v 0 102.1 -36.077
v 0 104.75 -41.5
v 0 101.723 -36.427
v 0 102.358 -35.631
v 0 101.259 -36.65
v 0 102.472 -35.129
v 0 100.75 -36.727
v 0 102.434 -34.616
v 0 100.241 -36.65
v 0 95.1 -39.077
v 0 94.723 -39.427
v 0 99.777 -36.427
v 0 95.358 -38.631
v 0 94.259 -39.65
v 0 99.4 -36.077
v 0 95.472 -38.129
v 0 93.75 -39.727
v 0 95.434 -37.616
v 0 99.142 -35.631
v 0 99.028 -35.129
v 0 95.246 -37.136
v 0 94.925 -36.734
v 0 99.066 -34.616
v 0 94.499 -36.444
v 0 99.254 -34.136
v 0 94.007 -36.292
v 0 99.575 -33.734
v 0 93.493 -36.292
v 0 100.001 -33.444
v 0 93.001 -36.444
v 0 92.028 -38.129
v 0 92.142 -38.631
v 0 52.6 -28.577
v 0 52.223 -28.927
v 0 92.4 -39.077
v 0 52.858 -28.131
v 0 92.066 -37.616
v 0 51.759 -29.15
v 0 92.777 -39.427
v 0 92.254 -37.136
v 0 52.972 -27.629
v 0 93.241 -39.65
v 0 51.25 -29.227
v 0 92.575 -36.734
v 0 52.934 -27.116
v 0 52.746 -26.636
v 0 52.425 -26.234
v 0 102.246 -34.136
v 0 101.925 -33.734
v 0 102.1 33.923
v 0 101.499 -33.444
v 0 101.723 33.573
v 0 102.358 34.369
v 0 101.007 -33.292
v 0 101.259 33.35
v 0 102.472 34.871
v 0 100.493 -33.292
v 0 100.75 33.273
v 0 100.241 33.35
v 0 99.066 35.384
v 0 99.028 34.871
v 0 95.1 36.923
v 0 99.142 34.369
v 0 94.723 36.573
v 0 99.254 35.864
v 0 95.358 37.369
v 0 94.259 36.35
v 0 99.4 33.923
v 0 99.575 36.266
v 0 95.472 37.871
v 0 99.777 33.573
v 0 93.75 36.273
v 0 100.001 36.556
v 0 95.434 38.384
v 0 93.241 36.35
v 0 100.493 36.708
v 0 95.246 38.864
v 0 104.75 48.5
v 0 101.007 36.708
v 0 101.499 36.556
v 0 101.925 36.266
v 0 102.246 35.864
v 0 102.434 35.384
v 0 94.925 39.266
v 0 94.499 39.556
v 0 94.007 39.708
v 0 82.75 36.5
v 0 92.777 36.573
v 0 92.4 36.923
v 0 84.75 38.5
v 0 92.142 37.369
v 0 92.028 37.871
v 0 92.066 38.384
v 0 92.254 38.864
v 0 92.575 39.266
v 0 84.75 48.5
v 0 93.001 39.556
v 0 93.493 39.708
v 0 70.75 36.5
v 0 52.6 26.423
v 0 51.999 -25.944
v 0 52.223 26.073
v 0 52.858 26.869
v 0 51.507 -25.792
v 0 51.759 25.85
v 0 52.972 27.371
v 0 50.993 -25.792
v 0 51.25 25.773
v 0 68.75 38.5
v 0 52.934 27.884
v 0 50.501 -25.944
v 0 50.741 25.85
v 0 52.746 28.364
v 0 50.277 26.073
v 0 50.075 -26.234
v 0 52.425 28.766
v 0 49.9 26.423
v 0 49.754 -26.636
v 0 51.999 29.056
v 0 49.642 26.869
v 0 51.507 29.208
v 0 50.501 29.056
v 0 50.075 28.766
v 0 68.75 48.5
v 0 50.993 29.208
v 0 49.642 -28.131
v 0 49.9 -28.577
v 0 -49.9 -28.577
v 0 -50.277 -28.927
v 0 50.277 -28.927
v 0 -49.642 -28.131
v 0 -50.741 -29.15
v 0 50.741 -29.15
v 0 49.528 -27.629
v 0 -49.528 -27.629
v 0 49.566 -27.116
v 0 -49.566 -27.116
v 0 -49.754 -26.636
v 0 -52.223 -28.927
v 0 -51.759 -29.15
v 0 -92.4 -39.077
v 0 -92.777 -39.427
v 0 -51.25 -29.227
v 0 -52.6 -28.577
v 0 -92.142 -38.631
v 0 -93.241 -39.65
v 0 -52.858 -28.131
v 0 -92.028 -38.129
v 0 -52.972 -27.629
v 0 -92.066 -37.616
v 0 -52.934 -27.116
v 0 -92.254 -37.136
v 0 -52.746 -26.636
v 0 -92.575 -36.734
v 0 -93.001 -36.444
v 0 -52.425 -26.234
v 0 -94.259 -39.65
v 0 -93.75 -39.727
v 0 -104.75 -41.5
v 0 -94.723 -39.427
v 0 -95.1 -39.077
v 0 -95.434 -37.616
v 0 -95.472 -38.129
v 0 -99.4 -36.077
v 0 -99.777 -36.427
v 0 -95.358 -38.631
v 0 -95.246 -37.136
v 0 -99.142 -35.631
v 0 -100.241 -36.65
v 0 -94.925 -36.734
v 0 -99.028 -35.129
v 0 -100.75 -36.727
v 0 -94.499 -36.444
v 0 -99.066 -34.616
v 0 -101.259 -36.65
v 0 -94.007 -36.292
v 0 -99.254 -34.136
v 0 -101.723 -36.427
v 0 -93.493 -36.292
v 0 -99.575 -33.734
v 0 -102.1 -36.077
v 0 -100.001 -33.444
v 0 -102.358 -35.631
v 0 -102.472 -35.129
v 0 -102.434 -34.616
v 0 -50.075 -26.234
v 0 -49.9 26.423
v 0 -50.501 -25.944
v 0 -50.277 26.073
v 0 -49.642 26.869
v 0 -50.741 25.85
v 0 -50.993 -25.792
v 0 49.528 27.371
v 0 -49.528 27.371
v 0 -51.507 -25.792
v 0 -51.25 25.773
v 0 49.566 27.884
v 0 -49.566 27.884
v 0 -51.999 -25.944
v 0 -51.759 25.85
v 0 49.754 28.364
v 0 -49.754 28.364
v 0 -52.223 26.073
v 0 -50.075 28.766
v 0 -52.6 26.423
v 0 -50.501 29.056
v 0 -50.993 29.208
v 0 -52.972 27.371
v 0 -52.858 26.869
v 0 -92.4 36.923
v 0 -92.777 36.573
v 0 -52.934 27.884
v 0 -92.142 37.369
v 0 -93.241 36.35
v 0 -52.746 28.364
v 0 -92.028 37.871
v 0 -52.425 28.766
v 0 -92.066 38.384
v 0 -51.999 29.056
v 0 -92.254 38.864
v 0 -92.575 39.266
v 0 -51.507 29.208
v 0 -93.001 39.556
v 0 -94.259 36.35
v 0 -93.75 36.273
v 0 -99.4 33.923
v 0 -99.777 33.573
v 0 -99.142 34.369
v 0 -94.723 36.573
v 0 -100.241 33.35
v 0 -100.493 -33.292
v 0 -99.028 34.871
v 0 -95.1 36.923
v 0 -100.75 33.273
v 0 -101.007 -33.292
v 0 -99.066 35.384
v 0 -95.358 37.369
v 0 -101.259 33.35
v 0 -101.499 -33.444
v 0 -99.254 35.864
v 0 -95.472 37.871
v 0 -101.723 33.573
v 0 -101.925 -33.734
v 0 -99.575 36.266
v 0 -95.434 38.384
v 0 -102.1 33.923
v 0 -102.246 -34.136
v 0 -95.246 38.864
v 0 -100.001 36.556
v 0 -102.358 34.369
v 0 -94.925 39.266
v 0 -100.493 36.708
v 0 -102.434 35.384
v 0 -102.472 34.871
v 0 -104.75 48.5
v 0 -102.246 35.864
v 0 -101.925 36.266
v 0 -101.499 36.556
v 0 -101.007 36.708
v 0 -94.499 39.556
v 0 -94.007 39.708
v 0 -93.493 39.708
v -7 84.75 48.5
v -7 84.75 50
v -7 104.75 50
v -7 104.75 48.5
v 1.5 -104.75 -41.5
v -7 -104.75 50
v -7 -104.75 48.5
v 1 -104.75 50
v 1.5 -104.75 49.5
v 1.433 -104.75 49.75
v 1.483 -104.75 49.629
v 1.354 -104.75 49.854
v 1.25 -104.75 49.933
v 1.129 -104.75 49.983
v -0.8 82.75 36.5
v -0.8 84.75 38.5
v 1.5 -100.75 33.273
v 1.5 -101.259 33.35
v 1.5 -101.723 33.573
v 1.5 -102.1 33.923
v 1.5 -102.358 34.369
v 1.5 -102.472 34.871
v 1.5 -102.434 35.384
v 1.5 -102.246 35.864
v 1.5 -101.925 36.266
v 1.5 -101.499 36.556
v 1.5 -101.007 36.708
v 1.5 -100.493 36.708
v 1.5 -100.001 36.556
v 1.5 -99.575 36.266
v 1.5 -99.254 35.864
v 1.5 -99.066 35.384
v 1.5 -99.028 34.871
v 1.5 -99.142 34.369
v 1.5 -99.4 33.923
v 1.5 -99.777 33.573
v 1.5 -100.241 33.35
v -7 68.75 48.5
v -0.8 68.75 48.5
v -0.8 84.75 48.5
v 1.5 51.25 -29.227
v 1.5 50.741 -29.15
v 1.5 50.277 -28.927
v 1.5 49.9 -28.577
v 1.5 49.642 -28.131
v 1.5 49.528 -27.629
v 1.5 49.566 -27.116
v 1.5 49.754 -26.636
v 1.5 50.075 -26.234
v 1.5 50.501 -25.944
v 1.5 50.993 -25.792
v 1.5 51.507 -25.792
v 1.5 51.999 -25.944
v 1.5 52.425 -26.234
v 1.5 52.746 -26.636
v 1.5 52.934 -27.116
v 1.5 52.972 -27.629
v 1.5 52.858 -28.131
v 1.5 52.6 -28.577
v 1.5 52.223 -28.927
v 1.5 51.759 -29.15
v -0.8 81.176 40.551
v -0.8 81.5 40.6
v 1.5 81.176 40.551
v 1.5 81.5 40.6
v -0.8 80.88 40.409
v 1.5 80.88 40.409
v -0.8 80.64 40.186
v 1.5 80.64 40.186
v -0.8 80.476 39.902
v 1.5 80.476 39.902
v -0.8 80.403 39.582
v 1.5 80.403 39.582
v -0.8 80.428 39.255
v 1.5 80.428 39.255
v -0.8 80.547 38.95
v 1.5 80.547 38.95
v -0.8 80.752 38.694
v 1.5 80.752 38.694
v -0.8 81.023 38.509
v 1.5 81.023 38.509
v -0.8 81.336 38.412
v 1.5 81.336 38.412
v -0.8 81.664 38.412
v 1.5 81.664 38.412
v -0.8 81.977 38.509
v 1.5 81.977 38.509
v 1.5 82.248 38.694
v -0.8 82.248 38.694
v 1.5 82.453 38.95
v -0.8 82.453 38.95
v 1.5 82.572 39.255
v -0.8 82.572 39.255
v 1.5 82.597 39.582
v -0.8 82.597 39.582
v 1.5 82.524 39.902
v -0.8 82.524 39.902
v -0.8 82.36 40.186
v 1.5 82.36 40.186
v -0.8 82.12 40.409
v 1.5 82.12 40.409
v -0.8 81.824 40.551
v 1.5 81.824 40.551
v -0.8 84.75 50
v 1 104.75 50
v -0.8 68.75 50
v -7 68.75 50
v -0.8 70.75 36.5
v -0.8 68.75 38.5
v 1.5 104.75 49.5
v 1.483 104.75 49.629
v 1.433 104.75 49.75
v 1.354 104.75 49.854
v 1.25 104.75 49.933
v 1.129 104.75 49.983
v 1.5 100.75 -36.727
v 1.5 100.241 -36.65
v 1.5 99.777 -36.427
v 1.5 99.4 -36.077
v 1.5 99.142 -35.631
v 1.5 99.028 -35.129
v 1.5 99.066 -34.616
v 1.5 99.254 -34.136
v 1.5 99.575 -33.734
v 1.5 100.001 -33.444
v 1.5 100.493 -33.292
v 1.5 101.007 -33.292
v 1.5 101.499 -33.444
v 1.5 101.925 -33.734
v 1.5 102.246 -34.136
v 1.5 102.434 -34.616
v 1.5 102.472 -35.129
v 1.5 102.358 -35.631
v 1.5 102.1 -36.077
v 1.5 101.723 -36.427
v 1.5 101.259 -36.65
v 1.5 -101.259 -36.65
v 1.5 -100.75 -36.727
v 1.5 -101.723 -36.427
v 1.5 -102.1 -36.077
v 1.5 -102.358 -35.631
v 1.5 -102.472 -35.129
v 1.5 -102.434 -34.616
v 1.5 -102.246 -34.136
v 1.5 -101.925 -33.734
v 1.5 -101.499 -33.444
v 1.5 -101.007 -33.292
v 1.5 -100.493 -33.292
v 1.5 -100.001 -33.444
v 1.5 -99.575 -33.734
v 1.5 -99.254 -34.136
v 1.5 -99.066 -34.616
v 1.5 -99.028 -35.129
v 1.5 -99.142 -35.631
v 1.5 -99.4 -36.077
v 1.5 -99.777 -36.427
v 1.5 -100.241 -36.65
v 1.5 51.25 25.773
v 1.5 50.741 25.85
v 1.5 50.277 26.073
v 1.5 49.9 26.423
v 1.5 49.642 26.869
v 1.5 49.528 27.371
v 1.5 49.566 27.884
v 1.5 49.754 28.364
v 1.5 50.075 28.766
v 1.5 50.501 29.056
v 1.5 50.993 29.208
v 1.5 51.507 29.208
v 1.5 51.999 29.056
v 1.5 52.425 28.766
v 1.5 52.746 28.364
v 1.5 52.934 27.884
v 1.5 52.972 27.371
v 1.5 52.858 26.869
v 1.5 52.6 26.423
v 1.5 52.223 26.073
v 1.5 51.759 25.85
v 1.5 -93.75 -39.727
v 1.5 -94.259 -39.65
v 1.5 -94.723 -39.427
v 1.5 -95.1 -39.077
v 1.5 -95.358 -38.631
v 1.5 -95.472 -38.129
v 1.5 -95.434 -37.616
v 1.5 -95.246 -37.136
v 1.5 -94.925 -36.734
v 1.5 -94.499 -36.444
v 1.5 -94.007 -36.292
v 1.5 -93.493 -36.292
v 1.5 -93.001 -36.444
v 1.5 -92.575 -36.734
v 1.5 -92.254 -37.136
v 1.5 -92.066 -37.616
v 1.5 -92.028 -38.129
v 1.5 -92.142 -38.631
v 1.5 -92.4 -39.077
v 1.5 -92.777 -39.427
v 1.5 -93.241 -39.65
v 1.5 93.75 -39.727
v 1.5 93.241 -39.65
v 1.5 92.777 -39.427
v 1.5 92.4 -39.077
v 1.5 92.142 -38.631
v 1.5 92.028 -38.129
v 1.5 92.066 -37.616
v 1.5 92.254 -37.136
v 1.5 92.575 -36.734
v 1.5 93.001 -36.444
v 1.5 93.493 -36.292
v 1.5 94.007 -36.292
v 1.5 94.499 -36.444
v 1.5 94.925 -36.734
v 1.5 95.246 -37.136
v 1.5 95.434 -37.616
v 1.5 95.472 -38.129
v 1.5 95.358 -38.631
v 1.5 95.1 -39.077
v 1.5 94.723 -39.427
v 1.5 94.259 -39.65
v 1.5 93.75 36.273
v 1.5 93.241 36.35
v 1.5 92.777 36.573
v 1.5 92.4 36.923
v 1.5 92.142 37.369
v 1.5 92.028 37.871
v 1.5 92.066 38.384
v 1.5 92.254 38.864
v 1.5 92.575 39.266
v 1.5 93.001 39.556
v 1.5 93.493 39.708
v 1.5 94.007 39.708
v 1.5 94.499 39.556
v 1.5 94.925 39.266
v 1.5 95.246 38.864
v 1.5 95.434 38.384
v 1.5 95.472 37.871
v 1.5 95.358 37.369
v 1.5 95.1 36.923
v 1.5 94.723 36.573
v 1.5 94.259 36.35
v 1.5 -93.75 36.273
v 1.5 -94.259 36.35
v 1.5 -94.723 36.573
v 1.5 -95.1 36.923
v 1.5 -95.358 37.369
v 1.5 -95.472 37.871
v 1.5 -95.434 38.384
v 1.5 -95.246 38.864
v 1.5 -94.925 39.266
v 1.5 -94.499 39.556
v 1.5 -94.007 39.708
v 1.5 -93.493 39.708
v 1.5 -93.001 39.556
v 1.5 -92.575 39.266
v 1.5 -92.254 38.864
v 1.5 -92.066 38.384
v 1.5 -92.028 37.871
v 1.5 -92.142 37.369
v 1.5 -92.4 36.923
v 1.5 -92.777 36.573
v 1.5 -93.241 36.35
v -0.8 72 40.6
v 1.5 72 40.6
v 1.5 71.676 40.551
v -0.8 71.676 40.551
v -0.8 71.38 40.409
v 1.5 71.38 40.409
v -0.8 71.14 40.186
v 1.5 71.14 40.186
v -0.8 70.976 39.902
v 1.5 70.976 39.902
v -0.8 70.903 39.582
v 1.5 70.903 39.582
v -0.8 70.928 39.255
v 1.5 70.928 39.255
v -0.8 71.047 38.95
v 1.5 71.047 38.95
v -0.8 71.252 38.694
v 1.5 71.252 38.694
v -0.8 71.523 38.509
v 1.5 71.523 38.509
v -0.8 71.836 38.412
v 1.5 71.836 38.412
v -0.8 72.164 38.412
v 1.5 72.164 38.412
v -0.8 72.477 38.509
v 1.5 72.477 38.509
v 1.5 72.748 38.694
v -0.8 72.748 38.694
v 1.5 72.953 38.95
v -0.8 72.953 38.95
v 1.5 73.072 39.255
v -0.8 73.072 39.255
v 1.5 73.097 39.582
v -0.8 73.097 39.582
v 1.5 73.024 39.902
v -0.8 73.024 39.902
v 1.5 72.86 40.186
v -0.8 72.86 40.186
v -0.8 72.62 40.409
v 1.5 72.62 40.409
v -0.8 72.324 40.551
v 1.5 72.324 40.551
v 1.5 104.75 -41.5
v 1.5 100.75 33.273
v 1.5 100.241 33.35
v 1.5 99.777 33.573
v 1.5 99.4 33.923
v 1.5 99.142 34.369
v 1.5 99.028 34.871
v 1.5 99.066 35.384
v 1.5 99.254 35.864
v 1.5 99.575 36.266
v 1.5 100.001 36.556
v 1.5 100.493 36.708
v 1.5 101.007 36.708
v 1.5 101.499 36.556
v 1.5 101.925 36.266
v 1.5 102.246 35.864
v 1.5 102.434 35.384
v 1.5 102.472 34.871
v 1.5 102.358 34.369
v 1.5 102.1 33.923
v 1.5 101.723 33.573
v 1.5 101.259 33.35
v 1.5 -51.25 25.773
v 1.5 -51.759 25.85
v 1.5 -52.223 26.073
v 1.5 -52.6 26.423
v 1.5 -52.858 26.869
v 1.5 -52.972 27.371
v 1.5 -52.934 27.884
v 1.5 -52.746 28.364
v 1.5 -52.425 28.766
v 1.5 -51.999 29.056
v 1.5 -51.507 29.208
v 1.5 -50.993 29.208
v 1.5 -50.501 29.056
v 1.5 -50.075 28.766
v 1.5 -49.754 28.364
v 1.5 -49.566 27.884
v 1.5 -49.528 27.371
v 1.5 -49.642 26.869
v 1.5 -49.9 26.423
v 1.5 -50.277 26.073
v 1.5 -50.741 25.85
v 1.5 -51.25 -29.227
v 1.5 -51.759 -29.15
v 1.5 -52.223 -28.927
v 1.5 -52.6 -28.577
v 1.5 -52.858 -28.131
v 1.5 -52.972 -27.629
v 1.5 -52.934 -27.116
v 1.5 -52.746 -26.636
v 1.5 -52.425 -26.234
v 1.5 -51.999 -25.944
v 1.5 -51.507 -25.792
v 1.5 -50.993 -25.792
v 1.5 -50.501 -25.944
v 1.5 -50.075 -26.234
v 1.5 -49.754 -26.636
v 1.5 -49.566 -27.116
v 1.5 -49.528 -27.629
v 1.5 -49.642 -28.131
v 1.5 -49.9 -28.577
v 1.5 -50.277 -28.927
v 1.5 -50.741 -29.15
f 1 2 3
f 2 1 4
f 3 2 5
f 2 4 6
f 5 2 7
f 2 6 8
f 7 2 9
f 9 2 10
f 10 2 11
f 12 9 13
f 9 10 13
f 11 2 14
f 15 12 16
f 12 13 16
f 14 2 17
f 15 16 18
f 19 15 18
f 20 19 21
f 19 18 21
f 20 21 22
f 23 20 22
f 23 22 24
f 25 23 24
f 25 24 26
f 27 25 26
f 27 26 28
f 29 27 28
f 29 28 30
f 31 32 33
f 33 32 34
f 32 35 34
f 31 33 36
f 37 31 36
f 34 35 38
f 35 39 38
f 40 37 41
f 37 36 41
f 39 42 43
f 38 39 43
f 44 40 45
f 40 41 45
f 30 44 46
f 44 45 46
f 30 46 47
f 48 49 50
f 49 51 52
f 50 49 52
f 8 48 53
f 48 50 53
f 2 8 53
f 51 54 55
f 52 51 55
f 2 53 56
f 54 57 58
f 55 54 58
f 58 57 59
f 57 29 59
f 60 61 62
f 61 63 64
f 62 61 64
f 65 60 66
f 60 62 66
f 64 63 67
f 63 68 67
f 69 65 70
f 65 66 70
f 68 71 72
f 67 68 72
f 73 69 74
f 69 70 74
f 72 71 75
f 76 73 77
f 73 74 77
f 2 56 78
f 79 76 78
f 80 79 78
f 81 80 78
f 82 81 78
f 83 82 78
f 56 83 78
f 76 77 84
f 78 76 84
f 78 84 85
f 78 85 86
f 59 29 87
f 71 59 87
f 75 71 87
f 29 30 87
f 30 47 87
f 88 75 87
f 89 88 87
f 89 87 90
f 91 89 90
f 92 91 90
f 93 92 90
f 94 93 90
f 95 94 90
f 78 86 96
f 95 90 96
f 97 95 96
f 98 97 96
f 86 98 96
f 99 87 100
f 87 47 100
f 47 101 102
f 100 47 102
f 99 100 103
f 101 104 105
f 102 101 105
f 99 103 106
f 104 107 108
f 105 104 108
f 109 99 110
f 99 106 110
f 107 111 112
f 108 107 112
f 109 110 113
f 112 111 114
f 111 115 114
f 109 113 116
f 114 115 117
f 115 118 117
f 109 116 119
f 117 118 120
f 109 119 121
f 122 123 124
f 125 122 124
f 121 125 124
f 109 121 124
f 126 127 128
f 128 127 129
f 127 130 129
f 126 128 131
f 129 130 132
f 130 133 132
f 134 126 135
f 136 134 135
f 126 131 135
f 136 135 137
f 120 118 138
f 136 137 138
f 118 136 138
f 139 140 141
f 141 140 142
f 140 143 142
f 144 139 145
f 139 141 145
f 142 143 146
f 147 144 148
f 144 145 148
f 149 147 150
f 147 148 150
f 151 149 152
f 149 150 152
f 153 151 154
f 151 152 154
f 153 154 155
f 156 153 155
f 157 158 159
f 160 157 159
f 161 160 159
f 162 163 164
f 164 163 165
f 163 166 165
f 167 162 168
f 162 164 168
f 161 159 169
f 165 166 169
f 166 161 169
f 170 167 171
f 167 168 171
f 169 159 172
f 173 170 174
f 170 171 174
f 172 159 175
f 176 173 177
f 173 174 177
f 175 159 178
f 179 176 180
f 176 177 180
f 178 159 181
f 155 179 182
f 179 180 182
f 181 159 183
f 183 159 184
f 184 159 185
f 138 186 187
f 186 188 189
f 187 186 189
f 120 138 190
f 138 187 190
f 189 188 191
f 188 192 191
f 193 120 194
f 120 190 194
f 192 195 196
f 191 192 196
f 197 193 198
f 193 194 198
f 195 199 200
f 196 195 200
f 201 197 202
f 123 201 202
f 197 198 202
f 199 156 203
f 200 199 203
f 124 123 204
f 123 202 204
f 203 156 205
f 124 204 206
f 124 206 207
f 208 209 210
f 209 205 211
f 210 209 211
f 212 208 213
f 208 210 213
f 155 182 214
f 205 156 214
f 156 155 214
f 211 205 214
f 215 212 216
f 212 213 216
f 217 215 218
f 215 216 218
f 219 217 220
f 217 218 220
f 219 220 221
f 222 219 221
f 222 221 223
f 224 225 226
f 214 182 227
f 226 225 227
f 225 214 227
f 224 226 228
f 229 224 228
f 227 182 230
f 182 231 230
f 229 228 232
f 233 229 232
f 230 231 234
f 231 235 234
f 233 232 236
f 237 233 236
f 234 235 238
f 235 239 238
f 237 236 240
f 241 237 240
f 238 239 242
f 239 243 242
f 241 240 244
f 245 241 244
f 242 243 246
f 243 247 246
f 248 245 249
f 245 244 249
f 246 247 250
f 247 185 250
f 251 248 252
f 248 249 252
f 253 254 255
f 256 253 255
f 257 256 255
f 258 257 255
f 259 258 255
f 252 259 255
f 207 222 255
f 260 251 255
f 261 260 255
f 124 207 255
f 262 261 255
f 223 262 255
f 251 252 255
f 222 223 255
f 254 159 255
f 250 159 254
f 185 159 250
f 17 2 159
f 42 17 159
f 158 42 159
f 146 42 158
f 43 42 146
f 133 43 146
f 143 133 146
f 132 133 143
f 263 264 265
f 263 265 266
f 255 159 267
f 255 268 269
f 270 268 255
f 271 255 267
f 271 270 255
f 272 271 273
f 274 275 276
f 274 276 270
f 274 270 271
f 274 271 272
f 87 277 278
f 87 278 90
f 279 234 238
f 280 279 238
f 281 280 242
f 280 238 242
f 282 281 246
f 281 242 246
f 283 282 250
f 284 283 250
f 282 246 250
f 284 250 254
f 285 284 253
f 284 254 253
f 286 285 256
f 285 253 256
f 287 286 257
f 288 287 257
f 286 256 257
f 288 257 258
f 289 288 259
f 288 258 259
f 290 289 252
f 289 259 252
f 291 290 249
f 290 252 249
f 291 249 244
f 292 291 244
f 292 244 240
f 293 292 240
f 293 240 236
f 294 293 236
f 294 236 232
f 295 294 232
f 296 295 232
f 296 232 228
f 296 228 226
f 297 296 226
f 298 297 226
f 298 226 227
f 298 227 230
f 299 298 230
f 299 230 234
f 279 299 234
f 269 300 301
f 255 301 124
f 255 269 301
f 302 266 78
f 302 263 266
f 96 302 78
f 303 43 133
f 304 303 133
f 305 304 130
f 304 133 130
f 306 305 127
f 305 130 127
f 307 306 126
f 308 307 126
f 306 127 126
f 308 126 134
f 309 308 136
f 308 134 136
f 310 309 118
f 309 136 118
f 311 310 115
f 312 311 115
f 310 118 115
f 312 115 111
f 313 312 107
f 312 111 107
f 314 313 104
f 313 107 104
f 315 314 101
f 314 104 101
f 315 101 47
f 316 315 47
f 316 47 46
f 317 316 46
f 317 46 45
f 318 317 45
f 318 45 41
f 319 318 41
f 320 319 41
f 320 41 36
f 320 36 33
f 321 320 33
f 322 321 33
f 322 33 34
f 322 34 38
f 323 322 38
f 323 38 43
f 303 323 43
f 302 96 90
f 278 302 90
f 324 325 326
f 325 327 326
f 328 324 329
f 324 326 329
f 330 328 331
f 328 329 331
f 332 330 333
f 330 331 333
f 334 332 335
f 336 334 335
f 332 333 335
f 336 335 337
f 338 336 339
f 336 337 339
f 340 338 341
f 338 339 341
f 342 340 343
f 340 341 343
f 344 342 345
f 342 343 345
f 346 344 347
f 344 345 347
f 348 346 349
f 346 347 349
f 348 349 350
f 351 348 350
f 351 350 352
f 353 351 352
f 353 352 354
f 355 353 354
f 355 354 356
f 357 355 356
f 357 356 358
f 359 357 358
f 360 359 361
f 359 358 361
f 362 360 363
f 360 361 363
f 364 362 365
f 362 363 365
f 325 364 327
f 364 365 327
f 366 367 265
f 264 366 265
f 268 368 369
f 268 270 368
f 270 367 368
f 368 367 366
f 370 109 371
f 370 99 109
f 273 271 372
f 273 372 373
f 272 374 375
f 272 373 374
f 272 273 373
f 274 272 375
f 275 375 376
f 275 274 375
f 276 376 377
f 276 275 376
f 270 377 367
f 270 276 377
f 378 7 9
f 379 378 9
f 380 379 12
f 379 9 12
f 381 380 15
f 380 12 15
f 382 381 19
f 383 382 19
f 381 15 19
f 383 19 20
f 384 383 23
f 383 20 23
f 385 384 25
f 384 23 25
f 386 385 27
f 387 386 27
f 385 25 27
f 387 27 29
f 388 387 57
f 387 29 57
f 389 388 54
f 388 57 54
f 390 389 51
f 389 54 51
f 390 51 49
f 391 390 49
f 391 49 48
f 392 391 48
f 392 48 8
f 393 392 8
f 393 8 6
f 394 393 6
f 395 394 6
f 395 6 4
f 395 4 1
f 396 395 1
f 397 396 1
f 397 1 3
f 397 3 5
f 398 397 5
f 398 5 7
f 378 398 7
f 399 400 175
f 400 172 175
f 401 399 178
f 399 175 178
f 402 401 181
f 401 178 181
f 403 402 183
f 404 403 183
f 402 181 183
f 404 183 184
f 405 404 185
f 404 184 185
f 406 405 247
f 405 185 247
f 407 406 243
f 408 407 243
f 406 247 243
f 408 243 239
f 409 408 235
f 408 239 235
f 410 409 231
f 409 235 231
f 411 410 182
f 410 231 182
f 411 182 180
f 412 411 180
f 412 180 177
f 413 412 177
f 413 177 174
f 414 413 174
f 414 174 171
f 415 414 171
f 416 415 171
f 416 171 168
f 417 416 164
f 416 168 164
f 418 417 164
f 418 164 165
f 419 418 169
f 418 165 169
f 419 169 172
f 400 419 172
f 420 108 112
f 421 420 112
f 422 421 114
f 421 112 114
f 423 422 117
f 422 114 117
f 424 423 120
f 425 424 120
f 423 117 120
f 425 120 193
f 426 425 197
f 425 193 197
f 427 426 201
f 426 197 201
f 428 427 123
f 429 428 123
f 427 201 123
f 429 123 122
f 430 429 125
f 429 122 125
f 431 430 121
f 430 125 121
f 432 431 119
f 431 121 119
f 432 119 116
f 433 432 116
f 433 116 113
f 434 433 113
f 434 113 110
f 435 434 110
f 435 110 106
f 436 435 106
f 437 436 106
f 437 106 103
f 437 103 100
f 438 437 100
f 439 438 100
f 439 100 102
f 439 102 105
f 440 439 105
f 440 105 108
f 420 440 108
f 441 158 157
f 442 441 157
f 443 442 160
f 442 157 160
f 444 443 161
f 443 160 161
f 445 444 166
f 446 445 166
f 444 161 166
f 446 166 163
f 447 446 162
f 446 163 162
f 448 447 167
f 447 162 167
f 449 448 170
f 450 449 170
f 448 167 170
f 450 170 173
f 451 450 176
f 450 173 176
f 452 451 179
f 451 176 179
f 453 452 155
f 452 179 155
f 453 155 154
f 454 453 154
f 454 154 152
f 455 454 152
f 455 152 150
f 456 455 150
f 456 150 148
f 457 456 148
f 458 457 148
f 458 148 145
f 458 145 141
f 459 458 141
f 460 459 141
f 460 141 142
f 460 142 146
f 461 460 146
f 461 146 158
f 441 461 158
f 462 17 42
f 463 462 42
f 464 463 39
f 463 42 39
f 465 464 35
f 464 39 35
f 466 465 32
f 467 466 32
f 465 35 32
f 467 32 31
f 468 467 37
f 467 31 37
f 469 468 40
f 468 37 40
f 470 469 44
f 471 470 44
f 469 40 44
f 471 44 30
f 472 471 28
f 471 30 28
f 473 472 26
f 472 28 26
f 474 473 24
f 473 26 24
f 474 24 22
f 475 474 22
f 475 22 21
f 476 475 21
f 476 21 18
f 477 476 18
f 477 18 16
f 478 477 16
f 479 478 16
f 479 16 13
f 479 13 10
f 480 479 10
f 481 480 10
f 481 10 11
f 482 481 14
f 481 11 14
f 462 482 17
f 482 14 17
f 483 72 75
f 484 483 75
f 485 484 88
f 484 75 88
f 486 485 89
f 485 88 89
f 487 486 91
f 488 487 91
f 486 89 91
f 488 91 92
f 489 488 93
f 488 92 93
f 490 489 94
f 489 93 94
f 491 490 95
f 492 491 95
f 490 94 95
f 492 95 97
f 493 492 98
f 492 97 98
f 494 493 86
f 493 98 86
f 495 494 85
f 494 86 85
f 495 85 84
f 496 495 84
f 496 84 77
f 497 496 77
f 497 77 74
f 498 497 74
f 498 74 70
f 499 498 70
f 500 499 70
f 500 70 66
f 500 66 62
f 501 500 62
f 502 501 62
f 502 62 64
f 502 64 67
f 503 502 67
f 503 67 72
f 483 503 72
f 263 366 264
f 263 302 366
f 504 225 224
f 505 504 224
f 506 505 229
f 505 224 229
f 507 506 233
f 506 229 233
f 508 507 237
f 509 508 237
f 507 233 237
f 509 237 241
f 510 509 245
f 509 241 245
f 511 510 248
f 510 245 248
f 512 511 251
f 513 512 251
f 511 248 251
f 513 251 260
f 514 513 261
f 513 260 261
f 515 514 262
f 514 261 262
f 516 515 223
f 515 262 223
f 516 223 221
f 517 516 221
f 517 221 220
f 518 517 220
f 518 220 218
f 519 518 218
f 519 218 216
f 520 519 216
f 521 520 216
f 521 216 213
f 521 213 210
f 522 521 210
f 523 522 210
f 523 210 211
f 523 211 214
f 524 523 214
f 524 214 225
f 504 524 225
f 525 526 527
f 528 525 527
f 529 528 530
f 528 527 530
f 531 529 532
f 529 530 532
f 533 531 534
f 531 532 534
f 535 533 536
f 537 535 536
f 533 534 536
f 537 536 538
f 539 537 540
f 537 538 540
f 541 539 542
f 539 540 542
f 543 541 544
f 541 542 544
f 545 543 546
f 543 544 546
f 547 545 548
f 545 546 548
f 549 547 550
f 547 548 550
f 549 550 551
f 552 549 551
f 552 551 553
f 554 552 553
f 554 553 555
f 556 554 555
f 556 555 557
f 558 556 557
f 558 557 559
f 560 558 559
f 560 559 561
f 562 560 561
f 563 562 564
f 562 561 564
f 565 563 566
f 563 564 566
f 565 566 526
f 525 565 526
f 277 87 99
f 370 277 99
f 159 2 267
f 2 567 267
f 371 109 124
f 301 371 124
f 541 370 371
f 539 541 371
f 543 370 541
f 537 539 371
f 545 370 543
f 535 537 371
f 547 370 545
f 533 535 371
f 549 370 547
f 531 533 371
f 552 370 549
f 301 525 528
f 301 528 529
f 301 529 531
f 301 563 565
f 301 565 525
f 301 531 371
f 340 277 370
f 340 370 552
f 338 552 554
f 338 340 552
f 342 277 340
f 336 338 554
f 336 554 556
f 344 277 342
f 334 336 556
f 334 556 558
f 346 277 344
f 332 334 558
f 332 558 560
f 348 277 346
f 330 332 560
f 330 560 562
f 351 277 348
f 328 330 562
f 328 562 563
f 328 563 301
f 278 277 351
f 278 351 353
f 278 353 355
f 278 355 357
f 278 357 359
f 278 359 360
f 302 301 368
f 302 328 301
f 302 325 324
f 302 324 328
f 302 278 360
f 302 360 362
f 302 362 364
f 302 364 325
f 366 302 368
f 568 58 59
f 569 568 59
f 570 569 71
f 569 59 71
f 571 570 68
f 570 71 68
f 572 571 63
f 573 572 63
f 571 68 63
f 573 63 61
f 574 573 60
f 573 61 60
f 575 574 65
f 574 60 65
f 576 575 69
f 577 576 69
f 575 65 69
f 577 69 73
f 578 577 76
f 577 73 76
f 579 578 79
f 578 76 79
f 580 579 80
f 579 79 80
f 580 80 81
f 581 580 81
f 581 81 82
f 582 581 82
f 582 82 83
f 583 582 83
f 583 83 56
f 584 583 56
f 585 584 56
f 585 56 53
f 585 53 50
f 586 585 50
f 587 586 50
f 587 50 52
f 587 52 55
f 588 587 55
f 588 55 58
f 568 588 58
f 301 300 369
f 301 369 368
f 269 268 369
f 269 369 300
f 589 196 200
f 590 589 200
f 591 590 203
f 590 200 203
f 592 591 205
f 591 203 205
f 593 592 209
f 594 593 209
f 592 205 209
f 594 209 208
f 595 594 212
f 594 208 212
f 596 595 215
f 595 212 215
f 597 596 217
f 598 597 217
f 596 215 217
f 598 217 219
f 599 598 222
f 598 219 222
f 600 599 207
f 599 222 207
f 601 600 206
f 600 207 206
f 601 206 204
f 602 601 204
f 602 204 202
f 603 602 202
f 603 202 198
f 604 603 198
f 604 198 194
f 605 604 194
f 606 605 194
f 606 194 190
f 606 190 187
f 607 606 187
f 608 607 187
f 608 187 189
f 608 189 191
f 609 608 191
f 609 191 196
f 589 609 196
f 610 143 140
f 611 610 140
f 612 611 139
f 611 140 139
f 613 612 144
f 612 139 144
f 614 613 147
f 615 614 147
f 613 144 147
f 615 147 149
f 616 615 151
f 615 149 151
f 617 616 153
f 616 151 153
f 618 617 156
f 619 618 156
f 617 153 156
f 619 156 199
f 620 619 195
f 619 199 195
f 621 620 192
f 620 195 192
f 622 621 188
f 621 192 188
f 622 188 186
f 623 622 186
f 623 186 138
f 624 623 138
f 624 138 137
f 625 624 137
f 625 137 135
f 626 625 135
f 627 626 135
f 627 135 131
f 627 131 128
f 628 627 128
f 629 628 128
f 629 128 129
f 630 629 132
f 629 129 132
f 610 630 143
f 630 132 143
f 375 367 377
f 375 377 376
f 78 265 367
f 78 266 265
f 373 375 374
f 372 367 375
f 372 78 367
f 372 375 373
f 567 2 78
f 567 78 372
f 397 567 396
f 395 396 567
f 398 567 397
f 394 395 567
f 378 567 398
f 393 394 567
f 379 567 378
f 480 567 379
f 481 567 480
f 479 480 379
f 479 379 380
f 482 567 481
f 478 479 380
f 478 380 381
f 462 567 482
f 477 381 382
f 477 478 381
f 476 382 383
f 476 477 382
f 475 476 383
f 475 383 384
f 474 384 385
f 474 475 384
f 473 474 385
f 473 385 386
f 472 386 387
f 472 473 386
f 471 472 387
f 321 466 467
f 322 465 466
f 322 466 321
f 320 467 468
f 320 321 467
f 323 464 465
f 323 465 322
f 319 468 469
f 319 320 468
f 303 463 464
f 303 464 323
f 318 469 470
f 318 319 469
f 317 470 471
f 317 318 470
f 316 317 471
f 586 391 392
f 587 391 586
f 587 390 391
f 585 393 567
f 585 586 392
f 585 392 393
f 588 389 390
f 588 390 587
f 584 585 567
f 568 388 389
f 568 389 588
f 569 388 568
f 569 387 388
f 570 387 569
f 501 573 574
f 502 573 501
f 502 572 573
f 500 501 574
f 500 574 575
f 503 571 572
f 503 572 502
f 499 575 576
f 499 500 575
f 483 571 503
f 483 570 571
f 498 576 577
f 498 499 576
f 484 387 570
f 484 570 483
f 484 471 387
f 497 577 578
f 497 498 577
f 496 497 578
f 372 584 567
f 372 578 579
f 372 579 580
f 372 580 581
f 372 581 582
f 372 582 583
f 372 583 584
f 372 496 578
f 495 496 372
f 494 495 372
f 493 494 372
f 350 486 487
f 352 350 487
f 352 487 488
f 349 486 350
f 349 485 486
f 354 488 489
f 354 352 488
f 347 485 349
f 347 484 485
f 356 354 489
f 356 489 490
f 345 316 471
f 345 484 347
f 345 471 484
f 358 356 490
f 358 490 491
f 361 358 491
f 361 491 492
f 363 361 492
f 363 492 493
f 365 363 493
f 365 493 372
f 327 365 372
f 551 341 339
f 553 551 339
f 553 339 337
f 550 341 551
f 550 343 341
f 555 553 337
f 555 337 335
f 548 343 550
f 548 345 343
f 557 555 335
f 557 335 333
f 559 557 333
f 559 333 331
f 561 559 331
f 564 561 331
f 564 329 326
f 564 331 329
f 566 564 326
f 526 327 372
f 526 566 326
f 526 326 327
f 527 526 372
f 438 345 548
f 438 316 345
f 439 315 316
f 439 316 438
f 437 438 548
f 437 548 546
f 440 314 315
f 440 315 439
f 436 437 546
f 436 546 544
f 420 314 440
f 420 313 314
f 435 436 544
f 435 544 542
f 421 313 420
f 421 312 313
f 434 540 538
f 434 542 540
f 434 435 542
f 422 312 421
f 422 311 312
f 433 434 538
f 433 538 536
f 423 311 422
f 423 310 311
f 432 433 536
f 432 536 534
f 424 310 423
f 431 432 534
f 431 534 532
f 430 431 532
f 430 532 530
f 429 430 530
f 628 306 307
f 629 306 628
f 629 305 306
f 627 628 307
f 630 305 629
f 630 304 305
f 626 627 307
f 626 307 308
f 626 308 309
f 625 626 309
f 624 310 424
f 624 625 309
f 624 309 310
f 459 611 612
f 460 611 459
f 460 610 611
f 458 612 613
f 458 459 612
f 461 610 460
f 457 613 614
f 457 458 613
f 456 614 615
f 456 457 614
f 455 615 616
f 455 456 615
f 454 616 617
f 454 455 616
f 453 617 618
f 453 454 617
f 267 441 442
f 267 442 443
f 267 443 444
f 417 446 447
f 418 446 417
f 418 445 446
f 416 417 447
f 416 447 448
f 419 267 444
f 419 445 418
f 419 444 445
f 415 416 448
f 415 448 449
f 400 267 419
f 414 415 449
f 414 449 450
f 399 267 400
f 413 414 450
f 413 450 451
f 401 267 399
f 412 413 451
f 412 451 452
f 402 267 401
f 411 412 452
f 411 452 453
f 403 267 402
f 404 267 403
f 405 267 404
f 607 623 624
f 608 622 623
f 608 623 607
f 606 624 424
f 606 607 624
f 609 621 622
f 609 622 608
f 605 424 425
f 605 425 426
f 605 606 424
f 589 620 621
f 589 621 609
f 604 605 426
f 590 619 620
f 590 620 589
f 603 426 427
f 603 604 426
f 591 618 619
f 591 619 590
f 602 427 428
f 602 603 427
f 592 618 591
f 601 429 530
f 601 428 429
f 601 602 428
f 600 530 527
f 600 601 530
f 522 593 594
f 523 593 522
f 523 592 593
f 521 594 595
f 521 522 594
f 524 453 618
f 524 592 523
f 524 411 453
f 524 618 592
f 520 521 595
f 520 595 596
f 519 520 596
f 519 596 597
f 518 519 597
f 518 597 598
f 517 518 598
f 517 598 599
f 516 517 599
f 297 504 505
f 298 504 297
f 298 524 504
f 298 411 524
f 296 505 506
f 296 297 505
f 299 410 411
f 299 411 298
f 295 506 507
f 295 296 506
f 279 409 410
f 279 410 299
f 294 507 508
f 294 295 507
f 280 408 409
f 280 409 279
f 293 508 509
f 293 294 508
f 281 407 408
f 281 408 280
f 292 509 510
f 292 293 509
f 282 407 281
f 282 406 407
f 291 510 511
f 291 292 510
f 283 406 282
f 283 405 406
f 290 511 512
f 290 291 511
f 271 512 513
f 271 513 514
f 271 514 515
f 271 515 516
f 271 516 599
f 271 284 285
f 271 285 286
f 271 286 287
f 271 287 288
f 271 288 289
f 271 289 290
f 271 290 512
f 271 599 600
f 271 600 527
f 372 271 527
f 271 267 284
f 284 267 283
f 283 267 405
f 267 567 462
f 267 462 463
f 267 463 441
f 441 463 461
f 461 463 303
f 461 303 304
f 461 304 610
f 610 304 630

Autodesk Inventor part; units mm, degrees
ref_plane "YZ Plane" through (0, 0, 0) normal (1, 0, 0) x (0, 1, 0)
ref_plane "XZ Plane" through (0, 0, 0) normal (0, 1, 0) x (-1, 0, 0)
ref_plane "XY Plane" through (0, 0, 0) normal (0, 0, 1) x (1, 0, 0)
sketch "Sketch1" plane through (0, 0, 0) normal (1, 0, 0) x (0, 1, 0)
  line L0 (48, 50) -> (-48, 50)
  line L1 (-48, 50) -> (-48, -50)
  line L2 (-48, -50) -> (48, -50)
  line L3 (48, -50) -> (48, 50)
  point P0 (0, 0)
  dimension "d0" = 96
  dimension "d1" = 100
  dimension "d2" = 50
  dimension "d3" = 48
extrude "Extrusion1" add sketch "Sketch1" along normal blind 1.5
sketch "Sketch2" plane through (0, -48, 50) normal (0, 0, 1) x (1, 0, 0)
  line L0 (0, 96) -> (1.5, 96) projected
  line L1 (1.5, 96) -> (-7, 96)
  line L2 (-7, 96) -> (-7, 0)
  line L3 (-7, 0) -> (1.5, 0)
  line L4 (1.5, 0) -> (1.5, 96)
  point P0 (0, 48)
  dimension "d6" = 8.5
  dimension "d7" = 96
extrude "Extrusion2" add sketch "Sketch2" against normal blind 1.5
mirror "Mirror1" about plane through (0, 0, 0) normal (0, 0, 1) of "Extrusion2"
fillet "Fillet1" radius 0.5 2 edges at (1.5, 0, 50) (1.5, 0, -50)
sketch "Sketch12" plane through (-7, -48, 48.5) normal (0, -1, 0) x (1, 0, 0)
  arc A0 (8, -98.5) -> (8.5, -98) centre (8, -98) ccw projected
  line L0 (8.5, 1) -> (8.5, -98) projected
  arc A1 (8.5, 1) -> (8, 1.5) centre (8, 1) ccw projected
  line L1 (0, 1.5) -> (8, 1.5) projected
  line L2 (0, 1.5) -> (0, 0) projected
  line L3 (7, 0) -> (0, 0) projected
  line L4 (7, 0) -> (7, -97) projected
  line L5 (7, -97) -> (0, -97) projected
  line L6 (0, -98.5) -> (0, -97) projected
  line L7 (0, -98.5) -> (8, -98.5) projected
  point P0 (7, -48.5)
extrude "Extrusion8" add sketch "Sketch12" along normal blind 56.75
sketch "Sketch13" plane through (-7, 48, 48.5) normal (0, 1, 0) x (1, 0, 0)
  arc A0 (8.5, 98) -> (8, 98.5) centre (8, 98) ccw projected
  line L0 (0, 98.5) -> (8, 98.5) projected
  line L1 (0, 98.5) -> (0, 97) projected
  line L2 (0, 97) -> (7, 97) projected
  line L3 (7, 97) -> (7, 0) projected
  line L4 (0, 0) -> (7, 0) projected
  line L5 (0, -1.5) -> (0, 0) projected
  line L6 (8, -1.5) -> (0, -1.5) projected
  arc A1 (8, -1.5) -> (8.5, -1) centre (8, -1) ccw projected
  line L7 (8.5, 98) -> (8.5, -1) projected
  point P0 (7, 48.5)
extrude "Extrusion9" add sketch "Sketch13" along normal blind 56.75
sketch "Sketch14" plane through (1.5, 0, 0) normal (1, 0, 0) x (0, 0, -1)
  line L0 (49.5, -104.75) -> (49.5, 104.75) projected
  line L1 (-49.5, 104.75) -> (49.5, 104.75) projected
  line L2 (-49.5, 104.75) -> (-49.5, -104.75) projected
  line L3 (49.5, -104.75) -> (-49.5, -104.75) projected
  line L4 (0, 0) -> (-23.5475, 0) construction
  point P0 (35, -100.75)
  point P1 (-35, -100.75)
  point P2 (35, 100.75)
  point P3 (-35, 100.75)
  dimension "d88" = 70
  dimension "d89" = 35
  dimension "d90" = 4
hole "Hole6" at (1.5, -100.75, -35) at (1.5, -100.75, 35) at (1.5, 100.75, -35) at (1.5, 100.75, 35) direction (-1, 0, 0) diameter 3.454 end through all clearance for "Flat Head Machine Screw (82)" size "#4" standard "Ansi Unified Screw Threads"
sketch "Sketch15" plane through (1.5, 0, 0) normal (1, 0, 0) x (0, 0, -1)
  circle A0 centre (-35, 100.75) radius 1.727 projected
  line L0 (0, 0) -> (0, 19.4005) construction
  line L1 (0, 0) -> (22.6917, 0) construction
  point P0 (-27.5, 51.25)
  point P1 (-27.5, -51.25)
  point P2 (27.5, 51.25)
  point P3 (27.5, -51.25)
  dimension "d150" = 7.5
  dimension "d167" = 102.5
  dimension "d168" = 51.25
hole "Hole7" at (1.5, 51.25, 27.5) at (1.5, -51.25, 27.5) at (1.5, -51.25, -27.5) at (1.5, 51.25, -27.5) direction (-1, 0, 0) diameter 3.454 end through all clearance for "Flat Head Machine Screw (82)" size "#4" standard "Ansi Unified Screw Threads"
sketch "Sketch16" plane through (0, 0, 0) normal (-1, 0, 0) x (0, 0, 1)
  line L0 (36.5, 68.75) -> (48.5, 68.75)
  line L1 (48.5, 68.75) -> (48.5, 84.75)
  line L2 (48.5, 84.75) -> (36.5, 84.75)
  line L3 (36.5, 84.75) -> (36.5, 68.75)
  circle A0 centre (-35, 100.75) radius 1.727 projected
  circle A1 centre (-35, -100.75) radius 1.727 projected
  circle A2 centre (35, -100.75) radius 1.727 projected
  circle A3 centre (35, 100.75) radius 1.727 projected
  line L4 (-48.5, 104.75) -> (-48.5, -104.75) projected
  line L5 (48.5, -104.75) -> (-48.5, -104.75) projected
  line L6 (48.5, -104.75) -> (48.5, 104.75) projected
  line L7 (-48.5, 104.75) -> (48.5, 104.75) projected
  line L8 (48.5, -104.75) -> (48.5, 104.75) projected
  circle A4 centre (27.5, 51.25) radius 1.727 projected
  point P0 (0, 0)
  dimension "d105" = 12
  dimension "d106" = 16
  dimension "d170" = 20
extrude "Extrusion10" add sketch "Sketch16" along normal blind 0.8 contours L3 L2 L1 L0
sketch "Sketch17" plane through (-0.8, 0, 0) normal (-1, 0, 0) x (0, 0, 1)
  line L0 (36.5, 68.75) -> (48.5, 68.75) projected
  line L1 (48.5, 84.75) -> (48.5, 68.75) projected
  line L2 (48.5, 84.75) -> (36.5, 84.75) projected
  line L3 (36.5, 84.75) -> (36.5, 68.75) projected
  line L4 (36.5, 68.75) -> (48.5, 68.75) projected
  line L5 (36.5, 68.75) -> (36.5, 84.75) projected
  point P0 (0, 0)
  point P1 (39.5, 72)
  point P2 (39.5, 81.5)
  point P3 (36.5, 76.75)
  dimension "d110" = 9.5
  dimension "d123" = 9
  dimension "d152" = 4.75
hole "Hole8" at (-0.8, 72, 39.5) at (-0.8, 81.5, 39.5) direction (1, 0, 0) diameter 2.2 end through all clearance for "Flat Head Machine Screw" size "M2" standard "Ansi Metric M Profile"
chamfer "Chamfer2" distance 2 angle 45 2 edges at (-0.4, 68.75, 36.5) (-0.4, 84.75, 36.5)
sketch "Sketch22" plane through (1.5, 0, 0) normal (1, 0, 0) x (0, 0, -1)
  line L0 (41.5, -104.75) -> (50, -104.75)
  line L1 (50, -104.75) -> (50, 104.75)
  line L2 (50, 104.75) -> (41.5, 104.75)
  line L3 (41.5, 104.75) -> (41.5, -104.75)
  line L4 (50, -104.75) -> (50, 104.75) projected
  line L5 (-49.5, 104.75) -> (49.5, 104.75) projected
  point P0 (0, 0)
  point P1 (50, 0)
  point P2 (45.75, 104.75)
  dimension "d146" = 8.5
extrude "Extrusion13" cut sketch "Sketch22" against normal through all
sketch "Sketch24" plane through (0, -48, 48.5) normal (0, 0, -1) x (-1, 0, 0)
  line L0 (0, 132.75) -> (0.8, 132.75) projected
  line L1 (0.8, 132.75) -> (7, 132.75)
  line L2 (7, 132.75) -> (7, 116.75)
  line L3 (7, 116.75) -> (0.8, 116.75)
  line L4 (0.8, 116.75) -> (0.8, 132.75)
  line L5 (0.8, 116.75) -> (0, 116.75) projected
  line L6 (0, -56.75) -> (0, 116.75) projected
  line L7 (7, -56.75) -> (0, -56.75) projected
  line L8 (7, 152.75) -> (7, -56.75) projected
  line L9 (0, 152.75) -> (7, 152.75) projected
  line L10 (0, 132.75) -> (0, 152.75) projected
  line L11 (0, 132.75) -> (0.8, 132.75) projected
  line L12 (0.8, 132.75) -> (0.8, 116.75) projected
  line L13 (7, 152.75) -> (7, -56.75) projected
  point P0 (0, 48)
  point P1 (7, 124.75)
  dimension "d160" = 16
extrude "Extrusion15" cut sketch "Sketch24" against normal through all contours L1 L2 L3 L4
sketch "Sketch25" plane through (1.5, 0, 0) normal (1, 0, 0) x (0, 0, -1)
  line L0 (41.5, -104.75) -> (41.5, 104.75) projected
  line L1 (-49.5, 104.75) -> (41.5, 104.75) projected
  line L2 (-49.5, 104.75) -> (-49.5, -104.75) projected
  line L3 (41.5, -104.75) -> (-49.5, -104.75) projected
  circle A0 centre (-39.5, 72) radius 1.1 projected
  circle A1 centre (-39.5, 81.5) radius 1.1 projected
  circle A2 centre (27.5, -51.25) radius 1.727 projected
  circle A3 centre (-27.5, 51.25) radius 1.727 projected
  circle A4 centre (-27.5, -51.25) radius 1.727 projected
  circle A5 centre (27.5, 51.25) radius 1.727 projected
  circle A6 centre (35, 100.75) radius 1.727 projected
  circle A7 centre (35, -100.75) radius 1.727 projected
  circle A8 centre (-35, -100.75) radius 1.727 projected
  circle A9 centre (-35, 100.75) radius 1.727 projected
  line L4 (0, 0) -> (-27.5, 0) construction
  point P0 (38, 93.75)
  point P1 (-38, 93.75)
  point P2 (38, -93.75)
  point P3 (-38, -93.75)
  dimension "d171" = 76
  dimension "d172" = 38
  dimension "d180" = 7
hole "Hole10" at (1.5, 93.75, -38) at (1.5, 93.75, 38) at (1.5, -93.75, -38) at (1.5, -93.75, 38) direction (-1, 0, 0) diameter 3.454 end through all clearance for "Flat Head Machine Screw (82)" size "#4" standard "Ansi Unified Screw Threads"
equation "\"d2\" = 0.5 * d1"
equation "\"d3\" = 0.5 * d0"
equation "\"d89\" = 0.5 * d88"
equation "\"d168\" = 0.5 * d167"
equation "\"d152\" = 0.5 * d110"
equation "\"d172\" = 0.5 * d171"
properties part number "FR-Default" material "Aluminum 6061"
